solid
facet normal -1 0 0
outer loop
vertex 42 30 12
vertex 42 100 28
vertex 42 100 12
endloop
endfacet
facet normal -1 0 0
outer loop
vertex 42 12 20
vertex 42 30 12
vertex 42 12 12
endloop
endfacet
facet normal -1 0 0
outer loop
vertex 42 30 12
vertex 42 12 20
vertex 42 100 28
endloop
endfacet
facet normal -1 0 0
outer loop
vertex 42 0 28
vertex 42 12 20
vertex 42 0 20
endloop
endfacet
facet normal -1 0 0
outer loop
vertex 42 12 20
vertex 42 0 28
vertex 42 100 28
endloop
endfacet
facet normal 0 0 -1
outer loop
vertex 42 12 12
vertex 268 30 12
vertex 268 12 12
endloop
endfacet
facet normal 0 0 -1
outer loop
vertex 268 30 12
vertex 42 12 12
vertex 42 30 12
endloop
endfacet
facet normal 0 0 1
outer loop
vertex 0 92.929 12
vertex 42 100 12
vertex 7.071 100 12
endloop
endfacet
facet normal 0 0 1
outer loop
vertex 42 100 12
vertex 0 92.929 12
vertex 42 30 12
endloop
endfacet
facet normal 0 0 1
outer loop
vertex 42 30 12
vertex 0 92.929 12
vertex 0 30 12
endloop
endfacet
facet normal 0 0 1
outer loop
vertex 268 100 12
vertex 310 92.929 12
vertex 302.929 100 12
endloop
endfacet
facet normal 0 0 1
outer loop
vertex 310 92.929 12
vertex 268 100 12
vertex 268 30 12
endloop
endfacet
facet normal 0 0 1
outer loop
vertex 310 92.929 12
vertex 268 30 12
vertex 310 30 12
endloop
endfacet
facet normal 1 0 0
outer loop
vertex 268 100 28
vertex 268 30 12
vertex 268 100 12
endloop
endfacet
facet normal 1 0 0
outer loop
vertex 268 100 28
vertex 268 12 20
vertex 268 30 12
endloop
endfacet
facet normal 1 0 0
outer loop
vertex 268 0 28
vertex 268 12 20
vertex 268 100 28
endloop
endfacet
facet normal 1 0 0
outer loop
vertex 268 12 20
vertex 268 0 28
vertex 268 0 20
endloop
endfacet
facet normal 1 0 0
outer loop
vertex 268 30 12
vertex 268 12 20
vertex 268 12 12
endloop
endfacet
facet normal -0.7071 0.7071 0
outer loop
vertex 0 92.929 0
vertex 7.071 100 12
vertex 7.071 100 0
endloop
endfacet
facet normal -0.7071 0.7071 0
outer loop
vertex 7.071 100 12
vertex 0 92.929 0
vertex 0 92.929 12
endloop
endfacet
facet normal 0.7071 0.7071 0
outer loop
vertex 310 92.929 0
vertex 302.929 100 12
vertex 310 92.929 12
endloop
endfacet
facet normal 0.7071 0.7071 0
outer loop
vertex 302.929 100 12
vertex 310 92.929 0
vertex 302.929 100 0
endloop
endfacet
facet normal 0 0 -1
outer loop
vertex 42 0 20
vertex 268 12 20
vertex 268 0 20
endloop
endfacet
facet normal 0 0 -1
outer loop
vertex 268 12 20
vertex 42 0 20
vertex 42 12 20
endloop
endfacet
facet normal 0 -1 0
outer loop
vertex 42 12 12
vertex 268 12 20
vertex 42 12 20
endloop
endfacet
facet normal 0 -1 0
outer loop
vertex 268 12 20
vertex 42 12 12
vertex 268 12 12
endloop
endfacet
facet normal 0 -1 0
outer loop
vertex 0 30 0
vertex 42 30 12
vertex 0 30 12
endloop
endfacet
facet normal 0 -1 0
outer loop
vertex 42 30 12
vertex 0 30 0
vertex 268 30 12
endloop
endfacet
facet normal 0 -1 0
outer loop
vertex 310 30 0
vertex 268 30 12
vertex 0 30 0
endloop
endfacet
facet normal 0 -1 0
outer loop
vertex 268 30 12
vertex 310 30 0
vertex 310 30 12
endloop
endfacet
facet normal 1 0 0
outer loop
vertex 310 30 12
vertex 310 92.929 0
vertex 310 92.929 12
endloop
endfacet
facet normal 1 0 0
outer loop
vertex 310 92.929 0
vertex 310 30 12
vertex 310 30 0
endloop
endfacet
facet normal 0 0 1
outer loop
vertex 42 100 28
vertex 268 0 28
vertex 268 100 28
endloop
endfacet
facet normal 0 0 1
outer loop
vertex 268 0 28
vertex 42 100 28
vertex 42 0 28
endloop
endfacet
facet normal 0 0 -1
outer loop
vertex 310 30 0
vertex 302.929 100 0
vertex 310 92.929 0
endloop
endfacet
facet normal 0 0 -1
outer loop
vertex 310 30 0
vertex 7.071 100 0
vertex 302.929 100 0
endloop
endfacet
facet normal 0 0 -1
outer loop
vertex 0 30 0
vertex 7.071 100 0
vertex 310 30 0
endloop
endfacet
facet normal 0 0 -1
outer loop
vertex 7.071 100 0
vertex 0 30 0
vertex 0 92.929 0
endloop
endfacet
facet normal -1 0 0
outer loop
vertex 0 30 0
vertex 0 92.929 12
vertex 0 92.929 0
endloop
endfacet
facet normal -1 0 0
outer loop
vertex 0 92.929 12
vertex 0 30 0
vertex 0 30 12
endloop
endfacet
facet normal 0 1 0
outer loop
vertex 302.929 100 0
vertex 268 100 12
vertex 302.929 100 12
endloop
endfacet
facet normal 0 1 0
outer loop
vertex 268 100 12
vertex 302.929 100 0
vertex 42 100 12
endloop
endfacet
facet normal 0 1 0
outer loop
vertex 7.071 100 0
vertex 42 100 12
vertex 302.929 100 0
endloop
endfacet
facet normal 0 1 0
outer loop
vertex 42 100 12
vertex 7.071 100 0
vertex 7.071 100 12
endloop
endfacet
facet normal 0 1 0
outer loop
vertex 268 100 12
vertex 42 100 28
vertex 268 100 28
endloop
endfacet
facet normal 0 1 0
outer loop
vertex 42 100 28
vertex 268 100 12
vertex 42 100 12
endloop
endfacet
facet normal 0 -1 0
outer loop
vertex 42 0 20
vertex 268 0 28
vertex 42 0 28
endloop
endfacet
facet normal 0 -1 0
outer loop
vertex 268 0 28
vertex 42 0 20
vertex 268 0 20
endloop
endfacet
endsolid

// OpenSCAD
include <../src/wardrobe.scad>;
plank_zx_front_side();
//github_openscad -o wardrobe_1/plank_zx_front_side.stl -D wardrobe_n=1 -D cutting_edge=0 -D break_view_length=0 wardrobe_1/plank_zx_front_side_stl.scad
